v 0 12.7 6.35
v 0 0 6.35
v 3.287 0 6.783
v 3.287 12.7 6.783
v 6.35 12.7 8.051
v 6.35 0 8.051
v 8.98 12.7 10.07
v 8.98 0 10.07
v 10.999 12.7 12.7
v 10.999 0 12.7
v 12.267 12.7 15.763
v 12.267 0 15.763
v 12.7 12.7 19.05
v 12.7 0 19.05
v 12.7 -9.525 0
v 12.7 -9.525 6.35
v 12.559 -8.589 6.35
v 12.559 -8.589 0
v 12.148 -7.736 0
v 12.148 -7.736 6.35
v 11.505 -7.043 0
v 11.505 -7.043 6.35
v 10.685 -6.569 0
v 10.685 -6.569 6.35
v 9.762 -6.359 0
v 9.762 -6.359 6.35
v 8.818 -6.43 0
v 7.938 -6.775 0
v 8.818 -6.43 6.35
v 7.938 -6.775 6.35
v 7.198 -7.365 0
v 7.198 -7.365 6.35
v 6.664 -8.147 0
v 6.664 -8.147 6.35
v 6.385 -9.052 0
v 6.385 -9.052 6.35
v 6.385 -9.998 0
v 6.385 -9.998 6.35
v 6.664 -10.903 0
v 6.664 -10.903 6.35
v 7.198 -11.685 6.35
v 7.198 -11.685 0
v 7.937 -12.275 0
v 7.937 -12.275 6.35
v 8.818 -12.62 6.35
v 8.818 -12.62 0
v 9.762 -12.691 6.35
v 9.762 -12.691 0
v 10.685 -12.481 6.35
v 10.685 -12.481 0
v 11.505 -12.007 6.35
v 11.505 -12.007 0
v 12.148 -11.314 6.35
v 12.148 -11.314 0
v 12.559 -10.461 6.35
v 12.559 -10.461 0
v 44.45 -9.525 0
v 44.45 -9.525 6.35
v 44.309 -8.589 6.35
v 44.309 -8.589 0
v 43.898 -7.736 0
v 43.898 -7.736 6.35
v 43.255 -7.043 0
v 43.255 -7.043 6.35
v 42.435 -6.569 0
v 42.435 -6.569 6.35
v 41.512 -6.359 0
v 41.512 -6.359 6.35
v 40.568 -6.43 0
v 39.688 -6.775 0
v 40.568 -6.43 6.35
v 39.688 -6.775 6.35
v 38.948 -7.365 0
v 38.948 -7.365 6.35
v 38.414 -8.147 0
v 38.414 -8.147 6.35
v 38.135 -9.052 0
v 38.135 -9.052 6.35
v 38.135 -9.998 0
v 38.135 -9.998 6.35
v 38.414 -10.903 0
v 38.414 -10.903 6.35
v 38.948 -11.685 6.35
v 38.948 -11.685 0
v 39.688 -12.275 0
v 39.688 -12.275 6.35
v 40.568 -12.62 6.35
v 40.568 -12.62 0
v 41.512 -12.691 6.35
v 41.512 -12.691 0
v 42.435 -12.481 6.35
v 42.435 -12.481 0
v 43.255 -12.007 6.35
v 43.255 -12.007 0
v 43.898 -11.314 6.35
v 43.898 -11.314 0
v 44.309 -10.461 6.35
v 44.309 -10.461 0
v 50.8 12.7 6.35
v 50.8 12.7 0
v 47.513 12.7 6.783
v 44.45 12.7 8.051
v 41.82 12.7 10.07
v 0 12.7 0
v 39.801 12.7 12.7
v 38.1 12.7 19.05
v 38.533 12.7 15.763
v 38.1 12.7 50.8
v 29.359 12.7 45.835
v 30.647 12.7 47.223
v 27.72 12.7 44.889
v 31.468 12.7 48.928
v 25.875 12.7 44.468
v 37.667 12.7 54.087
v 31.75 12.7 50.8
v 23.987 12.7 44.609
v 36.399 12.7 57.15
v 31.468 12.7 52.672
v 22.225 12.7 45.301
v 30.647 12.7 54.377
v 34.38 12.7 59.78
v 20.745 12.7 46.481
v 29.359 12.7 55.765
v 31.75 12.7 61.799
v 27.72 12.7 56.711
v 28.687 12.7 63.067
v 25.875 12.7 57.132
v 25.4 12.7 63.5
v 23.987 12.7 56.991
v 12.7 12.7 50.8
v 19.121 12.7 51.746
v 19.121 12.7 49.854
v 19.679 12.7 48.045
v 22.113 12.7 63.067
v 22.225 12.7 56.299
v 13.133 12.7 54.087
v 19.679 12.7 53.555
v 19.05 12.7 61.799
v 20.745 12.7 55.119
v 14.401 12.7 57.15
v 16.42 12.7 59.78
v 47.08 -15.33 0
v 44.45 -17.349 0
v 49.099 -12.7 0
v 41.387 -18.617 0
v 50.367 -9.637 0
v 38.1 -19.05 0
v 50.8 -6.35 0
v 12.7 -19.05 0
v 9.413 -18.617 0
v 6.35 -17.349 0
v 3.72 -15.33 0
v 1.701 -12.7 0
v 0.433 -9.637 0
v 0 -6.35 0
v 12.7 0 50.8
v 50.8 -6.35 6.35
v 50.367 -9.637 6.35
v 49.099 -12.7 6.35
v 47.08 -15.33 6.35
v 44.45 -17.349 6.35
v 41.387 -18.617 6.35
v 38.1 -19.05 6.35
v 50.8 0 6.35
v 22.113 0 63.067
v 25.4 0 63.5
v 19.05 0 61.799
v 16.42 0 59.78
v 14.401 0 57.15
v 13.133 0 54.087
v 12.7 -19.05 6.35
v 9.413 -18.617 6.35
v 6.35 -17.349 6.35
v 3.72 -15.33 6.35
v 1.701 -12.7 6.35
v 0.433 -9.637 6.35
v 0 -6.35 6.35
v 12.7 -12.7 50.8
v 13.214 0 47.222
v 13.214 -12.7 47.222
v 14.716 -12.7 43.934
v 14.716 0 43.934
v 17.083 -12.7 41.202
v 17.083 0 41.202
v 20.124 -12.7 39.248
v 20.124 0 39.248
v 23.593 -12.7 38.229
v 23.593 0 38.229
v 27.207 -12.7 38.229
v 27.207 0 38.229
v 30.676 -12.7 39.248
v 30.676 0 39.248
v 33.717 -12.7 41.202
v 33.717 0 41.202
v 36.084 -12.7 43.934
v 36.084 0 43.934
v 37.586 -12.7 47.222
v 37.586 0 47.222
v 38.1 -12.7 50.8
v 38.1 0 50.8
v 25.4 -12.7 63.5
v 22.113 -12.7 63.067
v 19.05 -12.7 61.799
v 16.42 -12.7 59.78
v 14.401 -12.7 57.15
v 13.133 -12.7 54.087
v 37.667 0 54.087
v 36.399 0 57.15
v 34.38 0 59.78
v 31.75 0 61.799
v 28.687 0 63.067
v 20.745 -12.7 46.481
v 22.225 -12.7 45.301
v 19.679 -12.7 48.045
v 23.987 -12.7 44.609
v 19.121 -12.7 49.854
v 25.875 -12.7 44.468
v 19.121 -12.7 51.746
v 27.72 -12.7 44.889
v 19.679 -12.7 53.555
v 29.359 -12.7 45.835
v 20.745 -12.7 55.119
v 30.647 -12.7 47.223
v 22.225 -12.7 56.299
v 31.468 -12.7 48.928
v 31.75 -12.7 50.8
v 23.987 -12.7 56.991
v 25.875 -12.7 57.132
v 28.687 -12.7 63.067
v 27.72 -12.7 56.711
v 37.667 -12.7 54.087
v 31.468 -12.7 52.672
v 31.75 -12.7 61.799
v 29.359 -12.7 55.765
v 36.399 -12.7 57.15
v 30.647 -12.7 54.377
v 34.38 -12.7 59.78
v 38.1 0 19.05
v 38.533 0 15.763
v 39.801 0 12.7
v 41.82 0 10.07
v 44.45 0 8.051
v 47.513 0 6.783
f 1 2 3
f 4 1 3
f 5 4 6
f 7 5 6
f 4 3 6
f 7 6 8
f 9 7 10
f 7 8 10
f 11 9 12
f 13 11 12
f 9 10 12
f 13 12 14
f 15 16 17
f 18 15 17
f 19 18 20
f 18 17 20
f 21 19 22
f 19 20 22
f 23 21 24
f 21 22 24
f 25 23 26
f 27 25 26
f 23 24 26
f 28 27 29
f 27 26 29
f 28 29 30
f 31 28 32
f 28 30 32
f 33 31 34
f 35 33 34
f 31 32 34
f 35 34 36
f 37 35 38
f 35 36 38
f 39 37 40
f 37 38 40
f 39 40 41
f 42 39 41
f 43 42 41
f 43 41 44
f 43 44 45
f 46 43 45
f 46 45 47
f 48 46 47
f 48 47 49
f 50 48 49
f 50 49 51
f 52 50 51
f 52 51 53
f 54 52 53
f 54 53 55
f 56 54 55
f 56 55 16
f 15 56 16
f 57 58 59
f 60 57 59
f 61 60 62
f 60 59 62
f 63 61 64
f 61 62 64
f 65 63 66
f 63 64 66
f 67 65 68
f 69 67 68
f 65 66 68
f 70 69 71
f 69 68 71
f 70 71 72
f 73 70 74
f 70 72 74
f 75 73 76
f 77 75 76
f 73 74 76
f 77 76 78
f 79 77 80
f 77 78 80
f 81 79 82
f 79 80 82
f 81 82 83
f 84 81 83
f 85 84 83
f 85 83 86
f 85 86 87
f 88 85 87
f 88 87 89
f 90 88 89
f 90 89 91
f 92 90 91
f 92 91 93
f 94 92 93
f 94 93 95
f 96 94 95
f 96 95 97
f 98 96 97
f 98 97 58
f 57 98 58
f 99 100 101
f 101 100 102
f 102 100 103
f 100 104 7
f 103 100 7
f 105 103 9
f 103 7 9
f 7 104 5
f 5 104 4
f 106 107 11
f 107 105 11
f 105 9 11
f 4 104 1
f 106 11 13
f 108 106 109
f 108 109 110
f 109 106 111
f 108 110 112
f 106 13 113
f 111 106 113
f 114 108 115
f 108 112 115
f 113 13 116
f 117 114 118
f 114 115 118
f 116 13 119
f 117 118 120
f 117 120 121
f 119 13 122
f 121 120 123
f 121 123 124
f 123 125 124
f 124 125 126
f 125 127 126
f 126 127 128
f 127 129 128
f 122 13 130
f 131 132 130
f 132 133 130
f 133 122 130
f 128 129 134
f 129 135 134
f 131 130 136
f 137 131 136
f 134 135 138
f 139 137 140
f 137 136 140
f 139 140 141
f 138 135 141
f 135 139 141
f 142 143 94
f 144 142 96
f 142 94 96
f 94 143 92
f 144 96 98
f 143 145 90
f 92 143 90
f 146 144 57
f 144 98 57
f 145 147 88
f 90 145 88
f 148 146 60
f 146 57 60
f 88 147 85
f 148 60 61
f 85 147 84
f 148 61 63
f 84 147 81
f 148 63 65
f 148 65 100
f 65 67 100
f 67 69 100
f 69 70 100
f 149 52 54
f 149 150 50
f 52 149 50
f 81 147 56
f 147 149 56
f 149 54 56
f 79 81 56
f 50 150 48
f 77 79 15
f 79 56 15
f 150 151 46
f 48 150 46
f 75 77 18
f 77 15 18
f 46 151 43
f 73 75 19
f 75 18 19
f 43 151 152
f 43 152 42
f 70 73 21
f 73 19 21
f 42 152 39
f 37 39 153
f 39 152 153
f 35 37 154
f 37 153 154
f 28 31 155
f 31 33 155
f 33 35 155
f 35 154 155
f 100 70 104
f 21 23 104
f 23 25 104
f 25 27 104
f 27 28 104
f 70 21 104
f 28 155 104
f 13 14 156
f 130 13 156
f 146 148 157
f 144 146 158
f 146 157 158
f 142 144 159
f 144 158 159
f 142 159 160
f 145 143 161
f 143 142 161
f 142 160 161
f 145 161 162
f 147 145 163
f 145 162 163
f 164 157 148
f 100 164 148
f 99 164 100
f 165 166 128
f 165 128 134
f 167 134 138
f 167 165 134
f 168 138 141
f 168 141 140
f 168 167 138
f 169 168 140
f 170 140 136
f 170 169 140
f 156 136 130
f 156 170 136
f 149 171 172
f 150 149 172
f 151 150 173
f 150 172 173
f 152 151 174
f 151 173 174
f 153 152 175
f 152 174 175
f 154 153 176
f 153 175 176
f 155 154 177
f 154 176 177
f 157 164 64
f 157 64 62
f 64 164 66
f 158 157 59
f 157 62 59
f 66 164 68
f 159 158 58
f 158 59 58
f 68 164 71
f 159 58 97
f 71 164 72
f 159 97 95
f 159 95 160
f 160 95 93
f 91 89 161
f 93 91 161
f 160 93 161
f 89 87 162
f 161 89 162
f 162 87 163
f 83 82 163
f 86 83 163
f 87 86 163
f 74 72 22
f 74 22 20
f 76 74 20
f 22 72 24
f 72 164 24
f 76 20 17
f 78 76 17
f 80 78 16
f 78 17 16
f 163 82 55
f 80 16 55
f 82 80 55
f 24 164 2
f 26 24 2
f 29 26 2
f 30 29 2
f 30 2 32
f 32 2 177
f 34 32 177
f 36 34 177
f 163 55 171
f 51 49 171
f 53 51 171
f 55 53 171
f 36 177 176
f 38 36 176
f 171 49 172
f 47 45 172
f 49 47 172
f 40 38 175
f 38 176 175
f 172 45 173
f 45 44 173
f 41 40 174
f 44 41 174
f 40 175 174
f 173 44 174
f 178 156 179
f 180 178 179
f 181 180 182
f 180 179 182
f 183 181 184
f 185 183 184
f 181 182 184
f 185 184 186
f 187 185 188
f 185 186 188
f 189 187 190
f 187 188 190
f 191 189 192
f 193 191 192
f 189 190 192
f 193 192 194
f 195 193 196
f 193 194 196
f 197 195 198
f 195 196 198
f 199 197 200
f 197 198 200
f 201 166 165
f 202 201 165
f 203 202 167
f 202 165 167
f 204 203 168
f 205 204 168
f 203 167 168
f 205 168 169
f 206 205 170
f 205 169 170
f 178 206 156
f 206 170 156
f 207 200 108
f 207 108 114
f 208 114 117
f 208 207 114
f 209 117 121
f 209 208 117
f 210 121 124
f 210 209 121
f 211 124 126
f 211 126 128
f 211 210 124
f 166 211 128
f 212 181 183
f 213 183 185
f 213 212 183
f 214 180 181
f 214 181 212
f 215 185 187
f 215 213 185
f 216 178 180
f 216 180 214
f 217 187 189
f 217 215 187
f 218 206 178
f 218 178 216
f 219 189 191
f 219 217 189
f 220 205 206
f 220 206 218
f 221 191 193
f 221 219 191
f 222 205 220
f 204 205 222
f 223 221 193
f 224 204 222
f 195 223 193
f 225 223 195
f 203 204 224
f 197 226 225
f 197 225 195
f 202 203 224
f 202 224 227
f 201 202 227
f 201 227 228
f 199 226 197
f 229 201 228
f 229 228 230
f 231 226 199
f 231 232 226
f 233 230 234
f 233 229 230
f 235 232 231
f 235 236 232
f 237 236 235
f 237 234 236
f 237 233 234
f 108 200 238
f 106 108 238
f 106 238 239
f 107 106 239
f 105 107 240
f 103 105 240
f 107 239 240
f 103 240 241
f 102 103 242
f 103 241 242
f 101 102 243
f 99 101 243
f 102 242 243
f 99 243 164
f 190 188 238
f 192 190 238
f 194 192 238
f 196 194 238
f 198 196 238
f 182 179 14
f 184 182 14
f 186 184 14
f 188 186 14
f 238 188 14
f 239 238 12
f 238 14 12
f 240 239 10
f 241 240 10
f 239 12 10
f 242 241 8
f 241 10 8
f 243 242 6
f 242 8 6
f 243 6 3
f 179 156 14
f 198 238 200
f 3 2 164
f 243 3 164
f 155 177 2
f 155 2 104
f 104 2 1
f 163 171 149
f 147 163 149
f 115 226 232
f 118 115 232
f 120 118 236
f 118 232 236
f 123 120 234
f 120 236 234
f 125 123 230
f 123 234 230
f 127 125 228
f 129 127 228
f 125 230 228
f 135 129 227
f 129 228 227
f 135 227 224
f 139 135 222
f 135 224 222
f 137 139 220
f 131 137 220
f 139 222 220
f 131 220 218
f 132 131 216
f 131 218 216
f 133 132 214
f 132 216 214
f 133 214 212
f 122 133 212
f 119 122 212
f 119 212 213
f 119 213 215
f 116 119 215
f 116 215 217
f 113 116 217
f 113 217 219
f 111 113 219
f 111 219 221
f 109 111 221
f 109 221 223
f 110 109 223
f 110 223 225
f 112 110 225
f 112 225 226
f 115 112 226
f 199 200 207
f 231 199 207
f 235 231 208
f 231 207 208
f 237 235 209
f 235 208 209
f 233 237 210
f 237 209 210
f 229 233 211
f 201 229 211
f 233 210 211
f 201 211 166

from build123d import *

# Parameters (mm, degrees)
F1_DEPTH  = 50.8
F3_DEPTH  = 12.701
F5_DEPTH  = 12.7
F6_DEPTH  = 12.701
F7_R      = 6.35
F8_DEPTH  = 25.401
F9_R      = 3.175
F10_DEPTH = 6.351
F12_DEPTH = 6.351


with BuildPart() as f1:
    # F0 (on Right) → F1 (new body)
    with BuildSketch(Plane.YZ):
        Polygon((12.7, 0), (12.7, 63.5), (0, 63.5), (0, 6.35), (-19.05, 6.35), (-19.05, 0), align=None)
    extrude(amount=F1_DEPTH)

    # F2 (on face) → F3 (cut, through all)
    with BuildSketch(Plane.XZ):
        with BuildLine():
            Line((12.7, 19.05), (12.7, 63.5))
            Line((12.7, 63.5), (0, 63.5))
            Line((0, 63.5), (0, 31.75))
            ThreePointArc((0, 31.75), (8.9802561211, 28.0302561211), (12.7, 19.05))
        make_face()
        with BuildLine():
            Line((38.1, 63.5), (38.1, 19.05))
            ThreePointArc((38.1, 19.05), (41.8197438789, 28.0302561211), (50.8, 31.75))
            Line((50.8, 31.75), (50.8, 63.5))
            Line((50.8, 63.5), (38.1, 63.5))
        make_face()
        with BuildLine():
            Line((0, 31.75), (0, 6.35))
            ThreePointArc((0, 6.35), (8.9802561211, 10.0697438789), (12.7, 19.05))
            ThreePointArc((12.7, 19.05), (8.9802561211, 28.0302561211), (0, 31.75))
        make_face()
        with BuildLine():
            ThreePointArc((50.8, 31.75), (41.8197438789, 28.0302561211), (38.1, 19.05))
            ThreePointArc((38.1, 19.05), (41.8197438789, 10.0697438789), (50.8, 6.35))
            Line((50.8, 6.35), (50.8, 31.75))
        make_face()
    extrude(amount=-F3_DEPTH, mode=Mode.SUBTRACT)

    # F4 (on face) → F5 (join)
    with BuildSketch(Plane.XZ):
        with BuildLine():
            ThreePointArc((12.7, 50.8), (25.4, 38.1), (38.1, 50.8))
            ThreePointArc((38.1, 50.8), (34.3802561211, 59.7802561211), (25.4, 63.5))
            ThreePointArc((25.4, 63.5), (16.4197438789, 59.7802561211), (12.7, 50.8))
        make_face()
    extrude(amount=F5_DEPTH)

    # F6 (cut, through all): faces of the model
    f6_faces = [f1.faces().sort_by_distance(p)[0] for p in [
        (15.5367728246, 0, 60.6632271754),
        (35.2632271754, 0, 60.6632271754),
    ]]
    extrude(f6_faces, amount=-F6_DEPTH, mode=Mode.SUBTRACT)

    # F7 (on face) → F8 (cut, through all)
    with BuildSketch(Plane.XZ.offset(12.7)):
        with Locations((25.4, 50.8)):
            Circle(F7_R)
    extrude(amount=-F8_DEPTH, mode=Mode.SUBTRACT)

    # F9 (on face) → F10 (cut, through all)
    with BuildSketch(Plane.XY.offset(6.35)):
        with Locations((9.525, -9.525)):
            Circle(F9_R)
        with Locations((41.275, -9.525)):
            Circle(F9_R)
    extrude(amount=-F10_DEPTH, mode=Mode.SUBTRACT)

    # F11 (on face) → F12 (cut, through all)
    with BuildSketch(Plane.XY.offset(6.35)):
        with BuildLine():
            Line((0, -19.05), (12.7, -19.05))
            ThreePointArc((12.7, -19.05), (3.7197438789, -15.3302561211), (0, -6.35))
            Line((0, -6.35), (0, -19.05))
        make_face()
        with BuildLine():
            ThreePointArc((50.8, -6.35), (47.0802561211, -15.3302561211), (38.1, -19.05))
            Line((38.1, -19.05), (50.8, -19.05))
            Line((50.8, -19.05), (50.8, -6.35))
        make_face()
    extrude(amount=-F12_DEPTH, mode=Mode.SUBTRACT)


solid = f1.part
